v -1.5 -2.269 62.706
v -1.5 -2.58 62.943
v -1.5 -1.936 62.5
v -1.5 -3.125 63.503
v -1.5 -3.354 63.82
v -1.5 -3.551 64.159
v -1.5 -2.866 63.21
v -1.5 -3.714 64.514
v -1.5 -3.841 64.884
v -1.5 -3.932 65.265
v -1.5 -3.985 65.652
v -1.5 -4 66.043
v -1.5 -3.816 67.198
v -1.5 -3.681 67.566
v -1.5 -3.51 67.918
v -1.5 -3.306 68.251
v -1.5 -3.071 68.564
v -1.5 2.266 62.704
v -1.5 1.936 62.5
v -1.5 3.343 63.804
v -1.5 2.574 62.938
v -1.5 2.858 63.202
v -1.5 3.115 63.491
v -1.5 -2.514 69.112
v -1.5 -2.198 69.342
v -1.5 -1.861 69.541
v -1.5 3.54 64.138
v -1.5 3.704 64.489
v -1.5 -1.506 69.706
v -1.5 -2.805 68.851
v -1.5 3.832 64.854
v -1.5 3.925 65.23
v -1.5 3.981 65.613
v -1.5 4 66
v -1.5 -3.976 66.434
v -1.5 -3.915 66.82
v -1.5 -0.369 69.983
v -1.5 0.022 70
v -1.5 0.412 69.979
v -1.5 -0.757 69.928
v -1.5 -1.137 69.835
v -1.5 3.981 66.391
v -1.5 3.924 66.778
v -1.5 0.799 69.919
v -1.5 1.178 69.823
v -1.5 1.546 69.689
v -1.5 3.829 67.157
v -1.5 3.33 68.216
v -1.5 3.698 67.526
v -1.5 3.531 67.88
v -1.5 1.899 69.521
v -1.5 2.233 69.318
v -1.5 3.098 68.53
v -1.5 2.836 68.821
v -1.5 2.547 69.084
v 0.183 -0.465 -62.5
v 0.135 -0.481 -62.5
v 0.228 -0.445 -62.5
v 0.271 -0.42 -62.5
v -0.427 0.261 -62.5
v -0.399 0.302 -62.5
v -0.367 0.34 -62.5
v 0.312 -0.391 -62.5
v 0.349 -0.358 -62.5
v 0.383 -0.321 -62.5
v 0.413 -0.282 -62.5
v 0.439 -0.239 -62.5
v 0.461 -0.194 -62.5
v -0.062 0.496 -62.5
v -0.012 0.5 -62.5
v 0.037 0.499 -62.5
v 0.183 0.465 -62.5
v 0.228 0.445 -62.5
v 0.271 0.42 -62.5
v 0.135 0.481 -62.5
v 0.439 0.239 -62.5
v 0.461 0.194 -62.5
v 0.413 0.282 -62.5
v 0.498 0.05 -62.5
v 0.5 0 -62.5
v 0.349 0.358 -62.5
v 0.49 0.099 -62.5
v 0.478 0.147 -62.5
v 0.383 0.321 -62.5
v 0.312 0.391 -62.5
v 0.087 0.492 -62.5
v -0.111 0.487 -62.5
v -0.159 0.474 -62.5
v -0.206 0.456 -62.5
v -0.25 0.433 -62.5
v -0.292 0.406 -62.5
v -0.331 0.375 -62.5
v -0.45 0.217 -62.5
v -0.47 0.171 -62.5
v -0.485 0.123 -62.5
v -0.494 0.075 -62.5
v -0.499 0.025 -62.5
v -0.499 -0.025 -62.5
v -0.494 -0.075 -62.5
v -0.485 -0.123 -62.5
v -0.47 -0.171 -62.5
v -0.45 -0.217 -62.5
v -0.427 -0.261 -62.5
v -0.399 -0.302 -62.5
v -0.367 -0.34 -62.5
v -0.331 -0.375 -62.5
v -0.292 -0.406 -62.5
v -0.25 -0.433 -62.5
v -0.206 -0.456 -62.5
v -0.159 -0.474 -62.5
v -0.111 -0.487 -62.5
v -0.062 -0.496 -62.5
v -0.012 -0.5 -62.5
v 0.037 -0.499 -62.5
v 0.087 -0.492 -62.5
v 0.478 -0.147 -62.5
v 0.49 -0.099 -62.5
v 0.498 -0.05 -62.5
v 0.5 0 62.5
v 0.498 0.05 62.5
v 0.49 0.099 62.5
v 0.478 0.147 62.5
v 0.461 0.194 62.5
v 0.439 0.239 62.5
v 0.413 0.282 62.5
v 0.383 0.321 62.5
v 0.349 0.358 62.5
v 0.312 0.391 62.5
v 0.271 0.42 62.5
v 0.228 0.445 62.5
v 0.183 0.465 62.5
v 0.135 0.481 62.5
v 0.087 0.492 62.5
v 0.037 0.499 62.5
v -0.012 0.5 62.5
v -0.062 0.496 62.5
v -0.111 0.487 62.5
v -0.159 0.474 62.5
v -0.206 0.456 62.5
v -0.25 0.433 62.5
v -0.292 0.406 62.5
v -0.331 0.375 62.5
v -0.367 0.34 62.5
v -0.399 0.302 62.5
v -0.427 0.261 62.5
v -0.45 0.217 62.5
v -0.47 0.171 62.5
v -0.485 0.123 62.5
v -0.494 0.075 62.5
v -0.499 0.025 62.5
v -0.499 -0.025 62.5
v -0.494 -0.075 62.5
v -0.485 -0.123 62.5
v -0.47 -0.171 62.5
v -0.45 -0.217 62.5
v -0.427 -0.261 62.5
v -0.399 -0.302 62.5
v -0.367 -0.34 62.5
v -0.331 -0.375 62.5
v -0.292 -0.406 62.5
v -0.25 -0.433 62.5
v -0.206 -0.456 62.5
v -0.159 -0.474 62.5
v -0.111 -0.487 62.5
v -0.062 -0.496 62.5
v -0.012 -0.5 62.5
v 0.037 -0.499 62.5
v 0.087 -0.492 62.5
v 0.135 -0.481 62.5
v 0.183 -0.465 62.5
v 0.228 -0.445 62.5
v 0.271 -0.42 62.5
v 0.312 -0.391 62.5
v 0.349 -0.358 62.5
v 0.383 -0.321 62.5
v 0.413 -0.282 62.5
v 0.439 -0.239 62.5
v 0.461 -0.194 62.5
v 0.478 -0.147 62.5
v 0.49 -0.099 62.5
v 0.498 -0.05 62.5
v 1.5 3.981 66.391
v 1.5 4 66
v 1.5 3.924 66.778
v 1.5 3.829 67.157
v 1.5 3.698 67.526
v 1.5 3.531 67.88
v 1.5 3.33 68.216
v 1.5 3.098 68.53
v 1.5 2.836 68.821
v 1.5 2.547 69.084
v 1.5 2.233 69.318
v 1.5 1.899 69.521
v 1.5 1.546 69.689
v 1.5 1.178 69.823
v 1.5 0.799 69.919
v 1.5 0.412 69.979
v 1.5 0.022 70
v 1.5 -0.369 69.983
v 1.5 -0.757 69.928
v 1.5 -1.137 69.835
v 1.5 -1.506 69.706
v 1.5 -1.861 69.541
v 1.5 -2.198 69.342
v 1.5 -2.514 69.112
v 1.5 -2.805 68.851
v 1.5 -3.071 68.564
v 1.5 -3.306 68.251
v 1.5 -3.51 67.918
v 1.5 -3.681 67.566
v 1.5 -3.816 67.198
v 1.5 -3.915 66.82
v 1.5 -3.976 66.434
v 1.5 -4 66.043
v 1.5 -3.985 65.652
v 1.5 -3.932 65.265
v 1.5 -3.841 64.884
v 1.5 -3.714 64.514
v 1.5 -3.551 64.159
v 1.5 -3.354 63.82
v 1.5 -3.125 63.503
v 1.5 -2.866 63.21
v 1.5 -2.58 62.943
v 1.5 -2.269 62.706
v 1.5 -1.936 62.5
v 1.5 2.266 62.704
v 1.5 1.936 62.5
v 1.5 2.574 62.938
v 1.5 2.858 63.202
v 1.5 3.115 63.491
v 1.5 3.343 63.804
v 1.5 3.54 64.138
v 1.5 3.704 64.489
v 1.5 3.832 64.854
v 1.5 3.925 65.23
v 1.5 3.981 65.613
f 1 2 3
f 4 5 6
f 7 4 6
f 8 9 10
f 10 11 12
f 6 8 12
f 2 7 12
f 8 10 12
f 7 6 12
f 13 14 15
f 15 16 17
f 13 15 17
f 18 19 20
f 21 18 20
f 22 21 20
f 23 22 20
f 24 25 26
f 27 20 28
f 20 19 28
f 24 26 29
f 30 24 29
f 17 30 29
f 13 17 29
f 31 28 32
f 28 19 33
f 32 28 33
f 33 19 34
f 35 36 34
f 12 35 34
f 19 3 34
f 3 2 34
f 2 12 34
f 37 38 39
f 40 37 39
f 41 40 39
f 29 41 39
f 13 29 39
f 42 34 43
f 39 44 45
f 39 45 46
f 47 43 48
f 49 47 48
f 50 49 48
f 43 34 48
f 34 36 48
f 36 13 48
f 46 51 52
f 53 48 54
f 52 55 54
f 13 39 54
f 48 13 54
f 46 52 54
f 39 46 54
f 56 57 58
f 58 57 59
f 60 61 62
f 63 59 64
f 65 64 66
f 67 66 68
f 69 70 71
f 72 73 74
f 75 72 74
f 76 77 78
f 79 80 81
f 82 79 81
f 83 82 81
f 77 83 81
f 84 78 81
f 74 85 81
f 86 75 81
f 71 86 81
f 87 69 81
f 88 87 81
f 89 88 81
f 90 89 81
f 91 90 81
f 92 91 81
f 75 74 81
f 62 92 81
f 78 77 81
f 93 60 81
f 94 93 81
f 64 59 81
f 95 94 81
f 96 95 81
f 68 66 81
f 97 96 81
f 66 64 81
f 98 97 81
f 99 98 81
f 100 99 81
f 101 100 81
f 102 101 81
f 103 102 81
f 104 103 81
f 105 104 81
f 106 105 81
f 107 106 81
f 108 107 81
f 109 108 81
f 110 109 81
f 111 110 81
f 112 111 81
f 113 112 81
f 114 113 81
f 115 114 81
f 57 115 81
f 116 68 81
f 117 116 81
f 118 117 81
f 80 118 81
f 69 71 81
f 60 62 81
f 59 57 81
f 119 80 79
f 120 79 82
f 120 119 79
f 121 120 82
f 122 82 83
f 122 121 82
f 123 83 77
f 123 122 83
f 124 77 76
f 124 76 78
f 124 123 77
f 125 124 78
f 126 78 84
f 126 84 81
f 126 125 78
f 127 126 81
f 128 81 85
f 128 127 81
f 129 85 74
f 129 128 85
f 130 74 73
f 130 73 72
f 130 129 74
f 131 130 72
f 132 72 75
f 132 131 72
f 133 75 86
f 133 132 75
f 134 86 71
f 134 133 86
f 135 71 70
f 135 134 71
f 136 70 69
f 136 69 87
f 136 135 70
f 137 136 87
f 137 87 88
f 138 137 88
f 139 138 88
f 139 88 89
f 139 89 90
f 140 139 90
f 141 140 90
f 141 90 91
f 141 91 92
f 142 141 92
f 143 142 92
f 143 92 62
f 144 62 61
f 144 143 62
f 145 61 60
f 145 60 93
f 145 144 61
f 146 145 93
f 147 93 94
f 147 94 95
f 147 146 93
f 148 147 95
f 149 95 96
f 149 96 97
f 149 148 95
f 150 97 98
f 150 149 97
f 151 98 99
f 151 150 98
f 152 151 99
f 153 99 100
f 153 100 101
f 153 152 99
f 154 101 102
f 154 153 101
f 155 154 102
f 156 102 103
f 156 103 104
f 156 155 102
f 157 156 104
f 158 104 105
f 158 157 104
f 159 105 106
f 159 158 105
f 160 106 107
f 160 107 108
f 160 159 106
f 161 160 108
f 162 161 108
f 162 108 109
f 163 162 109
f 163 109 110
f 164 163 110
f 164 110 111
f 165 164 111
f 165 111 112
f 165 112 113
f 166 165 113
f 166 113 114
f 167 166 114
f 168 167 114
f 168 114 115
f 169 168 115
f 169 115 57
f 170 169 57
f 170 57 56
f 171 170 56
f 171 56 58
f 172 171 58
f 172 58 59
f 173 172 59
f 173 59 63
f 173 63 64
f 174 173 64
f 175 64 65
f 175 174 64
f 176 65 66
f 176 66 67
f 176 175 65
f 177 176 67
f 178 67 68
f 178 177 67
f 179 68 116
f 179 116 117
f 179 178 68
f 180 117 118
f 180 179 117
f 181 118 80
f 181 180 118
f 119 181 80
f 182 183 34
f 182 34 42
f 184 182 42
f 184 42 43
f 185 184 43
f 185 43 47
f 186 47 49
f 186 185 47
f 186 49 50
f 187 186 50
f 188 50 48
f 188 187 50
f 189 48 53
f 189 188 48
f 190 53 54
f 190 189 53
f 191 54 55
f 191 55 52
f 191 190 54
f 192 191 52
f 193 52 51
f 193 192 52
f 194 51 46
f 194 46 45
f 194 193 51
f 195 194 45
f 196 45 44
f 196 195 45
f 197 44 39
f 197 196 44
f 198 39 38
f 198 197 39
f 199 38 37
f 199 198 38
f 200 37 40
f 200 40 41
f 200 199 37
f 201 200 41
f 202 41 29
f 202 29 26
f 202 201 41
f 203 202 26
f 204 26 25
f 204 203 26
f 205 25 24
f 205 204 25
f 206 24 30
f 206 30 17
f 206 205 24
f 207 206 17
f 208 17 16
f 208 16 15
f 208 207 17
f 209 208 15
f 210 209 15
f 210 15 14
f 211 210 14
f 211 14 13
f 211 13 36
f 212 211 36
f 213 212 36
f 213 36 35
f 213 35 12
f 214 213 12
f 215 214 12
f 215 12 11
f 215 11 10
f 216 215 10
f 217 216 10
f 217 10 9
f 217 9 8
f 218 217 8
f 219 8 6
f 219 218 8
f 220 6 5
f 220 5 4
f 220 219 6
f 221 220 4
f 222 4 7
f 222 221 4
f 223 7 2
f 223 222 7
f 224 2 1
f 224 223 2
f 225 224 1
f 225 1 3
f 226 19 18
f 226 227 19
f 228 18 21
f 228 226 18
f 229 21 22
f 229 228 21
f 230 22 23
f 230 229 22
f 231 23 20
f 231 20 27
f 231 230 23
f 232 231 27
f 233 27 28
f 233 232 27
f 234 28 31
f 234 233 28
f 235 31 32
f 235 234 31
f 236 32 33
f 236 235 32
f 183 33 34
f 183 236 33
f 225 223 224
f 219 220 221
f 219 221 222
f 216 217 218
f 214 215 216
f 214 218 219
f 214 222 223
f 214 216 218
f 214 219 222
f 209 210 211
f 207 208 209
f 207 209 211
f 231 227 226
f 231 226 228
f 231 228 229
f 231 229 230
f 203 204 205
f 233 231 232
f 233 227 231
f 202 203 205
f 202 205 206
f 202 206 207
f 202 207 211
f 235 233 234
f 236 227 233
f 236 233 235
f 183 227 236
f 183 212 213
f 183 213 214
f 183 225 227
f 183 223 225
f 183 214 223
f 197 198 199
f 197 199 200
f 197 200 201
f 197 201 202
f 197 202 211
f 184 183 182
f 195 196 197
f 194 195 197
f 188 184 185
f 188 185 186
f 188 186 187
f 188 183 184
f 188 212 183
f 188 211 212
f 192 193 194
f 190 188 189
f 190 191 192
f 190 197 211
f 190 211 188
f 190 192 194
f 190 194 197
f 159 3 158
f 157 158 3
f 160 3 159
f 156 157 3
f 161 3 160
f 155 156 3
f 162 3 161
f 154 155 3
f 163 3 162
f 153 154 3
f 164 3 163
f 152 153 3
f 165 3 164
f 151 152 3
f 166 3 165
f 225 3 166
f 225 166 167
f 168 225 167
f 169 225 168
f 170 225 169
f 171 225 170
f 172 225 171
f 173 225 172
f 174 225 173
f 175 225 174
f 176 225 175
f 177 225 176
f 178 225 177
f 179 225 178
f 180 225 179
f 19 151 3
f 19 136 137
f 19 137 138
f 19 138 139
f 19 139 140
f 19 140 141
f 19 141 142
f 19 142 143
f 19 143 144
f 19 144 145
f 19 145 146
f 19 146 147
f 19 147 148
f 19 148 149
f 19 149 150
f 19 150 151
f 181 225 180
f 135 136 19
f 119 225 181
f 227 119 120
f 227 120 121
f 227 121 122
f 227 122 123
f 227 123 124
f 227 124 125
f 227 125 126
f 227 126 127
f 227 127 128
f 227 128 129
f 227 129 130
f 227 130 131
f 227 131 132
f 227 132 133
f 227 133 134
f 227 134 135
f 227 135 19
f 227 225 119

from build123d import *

# Parameters (mm, degrees)
F0_R     = 0.5
F1_DEPTH = 62.5
F3_DEPTH = 1.5


with BuildPart() as f1:
    # F0 (on Top) → F1 (new body, symmetric)
    with BuildSketch(Plane.XY):
        Circle(F0_R)
    extrude(amount=F1_DEPTH, both=True)

    # F2 (on Right) → F3 (join, symmetric)
    with BuildSketch(Plane.YZ):
        with BuildLine():
            ThreePointArc((1.936492, 62.5), (3.44572, 63.968494), (4, 66))
            ThreePointArc((4, 66), (-2.031506, 69.44572), (-1.936492, 62.5))
            Line((-1.936492, 62.5), (1.936492, 62.5))
        make_face()
    extrude(amount=F3_DEPTH, both=True)


solid = f1.part
